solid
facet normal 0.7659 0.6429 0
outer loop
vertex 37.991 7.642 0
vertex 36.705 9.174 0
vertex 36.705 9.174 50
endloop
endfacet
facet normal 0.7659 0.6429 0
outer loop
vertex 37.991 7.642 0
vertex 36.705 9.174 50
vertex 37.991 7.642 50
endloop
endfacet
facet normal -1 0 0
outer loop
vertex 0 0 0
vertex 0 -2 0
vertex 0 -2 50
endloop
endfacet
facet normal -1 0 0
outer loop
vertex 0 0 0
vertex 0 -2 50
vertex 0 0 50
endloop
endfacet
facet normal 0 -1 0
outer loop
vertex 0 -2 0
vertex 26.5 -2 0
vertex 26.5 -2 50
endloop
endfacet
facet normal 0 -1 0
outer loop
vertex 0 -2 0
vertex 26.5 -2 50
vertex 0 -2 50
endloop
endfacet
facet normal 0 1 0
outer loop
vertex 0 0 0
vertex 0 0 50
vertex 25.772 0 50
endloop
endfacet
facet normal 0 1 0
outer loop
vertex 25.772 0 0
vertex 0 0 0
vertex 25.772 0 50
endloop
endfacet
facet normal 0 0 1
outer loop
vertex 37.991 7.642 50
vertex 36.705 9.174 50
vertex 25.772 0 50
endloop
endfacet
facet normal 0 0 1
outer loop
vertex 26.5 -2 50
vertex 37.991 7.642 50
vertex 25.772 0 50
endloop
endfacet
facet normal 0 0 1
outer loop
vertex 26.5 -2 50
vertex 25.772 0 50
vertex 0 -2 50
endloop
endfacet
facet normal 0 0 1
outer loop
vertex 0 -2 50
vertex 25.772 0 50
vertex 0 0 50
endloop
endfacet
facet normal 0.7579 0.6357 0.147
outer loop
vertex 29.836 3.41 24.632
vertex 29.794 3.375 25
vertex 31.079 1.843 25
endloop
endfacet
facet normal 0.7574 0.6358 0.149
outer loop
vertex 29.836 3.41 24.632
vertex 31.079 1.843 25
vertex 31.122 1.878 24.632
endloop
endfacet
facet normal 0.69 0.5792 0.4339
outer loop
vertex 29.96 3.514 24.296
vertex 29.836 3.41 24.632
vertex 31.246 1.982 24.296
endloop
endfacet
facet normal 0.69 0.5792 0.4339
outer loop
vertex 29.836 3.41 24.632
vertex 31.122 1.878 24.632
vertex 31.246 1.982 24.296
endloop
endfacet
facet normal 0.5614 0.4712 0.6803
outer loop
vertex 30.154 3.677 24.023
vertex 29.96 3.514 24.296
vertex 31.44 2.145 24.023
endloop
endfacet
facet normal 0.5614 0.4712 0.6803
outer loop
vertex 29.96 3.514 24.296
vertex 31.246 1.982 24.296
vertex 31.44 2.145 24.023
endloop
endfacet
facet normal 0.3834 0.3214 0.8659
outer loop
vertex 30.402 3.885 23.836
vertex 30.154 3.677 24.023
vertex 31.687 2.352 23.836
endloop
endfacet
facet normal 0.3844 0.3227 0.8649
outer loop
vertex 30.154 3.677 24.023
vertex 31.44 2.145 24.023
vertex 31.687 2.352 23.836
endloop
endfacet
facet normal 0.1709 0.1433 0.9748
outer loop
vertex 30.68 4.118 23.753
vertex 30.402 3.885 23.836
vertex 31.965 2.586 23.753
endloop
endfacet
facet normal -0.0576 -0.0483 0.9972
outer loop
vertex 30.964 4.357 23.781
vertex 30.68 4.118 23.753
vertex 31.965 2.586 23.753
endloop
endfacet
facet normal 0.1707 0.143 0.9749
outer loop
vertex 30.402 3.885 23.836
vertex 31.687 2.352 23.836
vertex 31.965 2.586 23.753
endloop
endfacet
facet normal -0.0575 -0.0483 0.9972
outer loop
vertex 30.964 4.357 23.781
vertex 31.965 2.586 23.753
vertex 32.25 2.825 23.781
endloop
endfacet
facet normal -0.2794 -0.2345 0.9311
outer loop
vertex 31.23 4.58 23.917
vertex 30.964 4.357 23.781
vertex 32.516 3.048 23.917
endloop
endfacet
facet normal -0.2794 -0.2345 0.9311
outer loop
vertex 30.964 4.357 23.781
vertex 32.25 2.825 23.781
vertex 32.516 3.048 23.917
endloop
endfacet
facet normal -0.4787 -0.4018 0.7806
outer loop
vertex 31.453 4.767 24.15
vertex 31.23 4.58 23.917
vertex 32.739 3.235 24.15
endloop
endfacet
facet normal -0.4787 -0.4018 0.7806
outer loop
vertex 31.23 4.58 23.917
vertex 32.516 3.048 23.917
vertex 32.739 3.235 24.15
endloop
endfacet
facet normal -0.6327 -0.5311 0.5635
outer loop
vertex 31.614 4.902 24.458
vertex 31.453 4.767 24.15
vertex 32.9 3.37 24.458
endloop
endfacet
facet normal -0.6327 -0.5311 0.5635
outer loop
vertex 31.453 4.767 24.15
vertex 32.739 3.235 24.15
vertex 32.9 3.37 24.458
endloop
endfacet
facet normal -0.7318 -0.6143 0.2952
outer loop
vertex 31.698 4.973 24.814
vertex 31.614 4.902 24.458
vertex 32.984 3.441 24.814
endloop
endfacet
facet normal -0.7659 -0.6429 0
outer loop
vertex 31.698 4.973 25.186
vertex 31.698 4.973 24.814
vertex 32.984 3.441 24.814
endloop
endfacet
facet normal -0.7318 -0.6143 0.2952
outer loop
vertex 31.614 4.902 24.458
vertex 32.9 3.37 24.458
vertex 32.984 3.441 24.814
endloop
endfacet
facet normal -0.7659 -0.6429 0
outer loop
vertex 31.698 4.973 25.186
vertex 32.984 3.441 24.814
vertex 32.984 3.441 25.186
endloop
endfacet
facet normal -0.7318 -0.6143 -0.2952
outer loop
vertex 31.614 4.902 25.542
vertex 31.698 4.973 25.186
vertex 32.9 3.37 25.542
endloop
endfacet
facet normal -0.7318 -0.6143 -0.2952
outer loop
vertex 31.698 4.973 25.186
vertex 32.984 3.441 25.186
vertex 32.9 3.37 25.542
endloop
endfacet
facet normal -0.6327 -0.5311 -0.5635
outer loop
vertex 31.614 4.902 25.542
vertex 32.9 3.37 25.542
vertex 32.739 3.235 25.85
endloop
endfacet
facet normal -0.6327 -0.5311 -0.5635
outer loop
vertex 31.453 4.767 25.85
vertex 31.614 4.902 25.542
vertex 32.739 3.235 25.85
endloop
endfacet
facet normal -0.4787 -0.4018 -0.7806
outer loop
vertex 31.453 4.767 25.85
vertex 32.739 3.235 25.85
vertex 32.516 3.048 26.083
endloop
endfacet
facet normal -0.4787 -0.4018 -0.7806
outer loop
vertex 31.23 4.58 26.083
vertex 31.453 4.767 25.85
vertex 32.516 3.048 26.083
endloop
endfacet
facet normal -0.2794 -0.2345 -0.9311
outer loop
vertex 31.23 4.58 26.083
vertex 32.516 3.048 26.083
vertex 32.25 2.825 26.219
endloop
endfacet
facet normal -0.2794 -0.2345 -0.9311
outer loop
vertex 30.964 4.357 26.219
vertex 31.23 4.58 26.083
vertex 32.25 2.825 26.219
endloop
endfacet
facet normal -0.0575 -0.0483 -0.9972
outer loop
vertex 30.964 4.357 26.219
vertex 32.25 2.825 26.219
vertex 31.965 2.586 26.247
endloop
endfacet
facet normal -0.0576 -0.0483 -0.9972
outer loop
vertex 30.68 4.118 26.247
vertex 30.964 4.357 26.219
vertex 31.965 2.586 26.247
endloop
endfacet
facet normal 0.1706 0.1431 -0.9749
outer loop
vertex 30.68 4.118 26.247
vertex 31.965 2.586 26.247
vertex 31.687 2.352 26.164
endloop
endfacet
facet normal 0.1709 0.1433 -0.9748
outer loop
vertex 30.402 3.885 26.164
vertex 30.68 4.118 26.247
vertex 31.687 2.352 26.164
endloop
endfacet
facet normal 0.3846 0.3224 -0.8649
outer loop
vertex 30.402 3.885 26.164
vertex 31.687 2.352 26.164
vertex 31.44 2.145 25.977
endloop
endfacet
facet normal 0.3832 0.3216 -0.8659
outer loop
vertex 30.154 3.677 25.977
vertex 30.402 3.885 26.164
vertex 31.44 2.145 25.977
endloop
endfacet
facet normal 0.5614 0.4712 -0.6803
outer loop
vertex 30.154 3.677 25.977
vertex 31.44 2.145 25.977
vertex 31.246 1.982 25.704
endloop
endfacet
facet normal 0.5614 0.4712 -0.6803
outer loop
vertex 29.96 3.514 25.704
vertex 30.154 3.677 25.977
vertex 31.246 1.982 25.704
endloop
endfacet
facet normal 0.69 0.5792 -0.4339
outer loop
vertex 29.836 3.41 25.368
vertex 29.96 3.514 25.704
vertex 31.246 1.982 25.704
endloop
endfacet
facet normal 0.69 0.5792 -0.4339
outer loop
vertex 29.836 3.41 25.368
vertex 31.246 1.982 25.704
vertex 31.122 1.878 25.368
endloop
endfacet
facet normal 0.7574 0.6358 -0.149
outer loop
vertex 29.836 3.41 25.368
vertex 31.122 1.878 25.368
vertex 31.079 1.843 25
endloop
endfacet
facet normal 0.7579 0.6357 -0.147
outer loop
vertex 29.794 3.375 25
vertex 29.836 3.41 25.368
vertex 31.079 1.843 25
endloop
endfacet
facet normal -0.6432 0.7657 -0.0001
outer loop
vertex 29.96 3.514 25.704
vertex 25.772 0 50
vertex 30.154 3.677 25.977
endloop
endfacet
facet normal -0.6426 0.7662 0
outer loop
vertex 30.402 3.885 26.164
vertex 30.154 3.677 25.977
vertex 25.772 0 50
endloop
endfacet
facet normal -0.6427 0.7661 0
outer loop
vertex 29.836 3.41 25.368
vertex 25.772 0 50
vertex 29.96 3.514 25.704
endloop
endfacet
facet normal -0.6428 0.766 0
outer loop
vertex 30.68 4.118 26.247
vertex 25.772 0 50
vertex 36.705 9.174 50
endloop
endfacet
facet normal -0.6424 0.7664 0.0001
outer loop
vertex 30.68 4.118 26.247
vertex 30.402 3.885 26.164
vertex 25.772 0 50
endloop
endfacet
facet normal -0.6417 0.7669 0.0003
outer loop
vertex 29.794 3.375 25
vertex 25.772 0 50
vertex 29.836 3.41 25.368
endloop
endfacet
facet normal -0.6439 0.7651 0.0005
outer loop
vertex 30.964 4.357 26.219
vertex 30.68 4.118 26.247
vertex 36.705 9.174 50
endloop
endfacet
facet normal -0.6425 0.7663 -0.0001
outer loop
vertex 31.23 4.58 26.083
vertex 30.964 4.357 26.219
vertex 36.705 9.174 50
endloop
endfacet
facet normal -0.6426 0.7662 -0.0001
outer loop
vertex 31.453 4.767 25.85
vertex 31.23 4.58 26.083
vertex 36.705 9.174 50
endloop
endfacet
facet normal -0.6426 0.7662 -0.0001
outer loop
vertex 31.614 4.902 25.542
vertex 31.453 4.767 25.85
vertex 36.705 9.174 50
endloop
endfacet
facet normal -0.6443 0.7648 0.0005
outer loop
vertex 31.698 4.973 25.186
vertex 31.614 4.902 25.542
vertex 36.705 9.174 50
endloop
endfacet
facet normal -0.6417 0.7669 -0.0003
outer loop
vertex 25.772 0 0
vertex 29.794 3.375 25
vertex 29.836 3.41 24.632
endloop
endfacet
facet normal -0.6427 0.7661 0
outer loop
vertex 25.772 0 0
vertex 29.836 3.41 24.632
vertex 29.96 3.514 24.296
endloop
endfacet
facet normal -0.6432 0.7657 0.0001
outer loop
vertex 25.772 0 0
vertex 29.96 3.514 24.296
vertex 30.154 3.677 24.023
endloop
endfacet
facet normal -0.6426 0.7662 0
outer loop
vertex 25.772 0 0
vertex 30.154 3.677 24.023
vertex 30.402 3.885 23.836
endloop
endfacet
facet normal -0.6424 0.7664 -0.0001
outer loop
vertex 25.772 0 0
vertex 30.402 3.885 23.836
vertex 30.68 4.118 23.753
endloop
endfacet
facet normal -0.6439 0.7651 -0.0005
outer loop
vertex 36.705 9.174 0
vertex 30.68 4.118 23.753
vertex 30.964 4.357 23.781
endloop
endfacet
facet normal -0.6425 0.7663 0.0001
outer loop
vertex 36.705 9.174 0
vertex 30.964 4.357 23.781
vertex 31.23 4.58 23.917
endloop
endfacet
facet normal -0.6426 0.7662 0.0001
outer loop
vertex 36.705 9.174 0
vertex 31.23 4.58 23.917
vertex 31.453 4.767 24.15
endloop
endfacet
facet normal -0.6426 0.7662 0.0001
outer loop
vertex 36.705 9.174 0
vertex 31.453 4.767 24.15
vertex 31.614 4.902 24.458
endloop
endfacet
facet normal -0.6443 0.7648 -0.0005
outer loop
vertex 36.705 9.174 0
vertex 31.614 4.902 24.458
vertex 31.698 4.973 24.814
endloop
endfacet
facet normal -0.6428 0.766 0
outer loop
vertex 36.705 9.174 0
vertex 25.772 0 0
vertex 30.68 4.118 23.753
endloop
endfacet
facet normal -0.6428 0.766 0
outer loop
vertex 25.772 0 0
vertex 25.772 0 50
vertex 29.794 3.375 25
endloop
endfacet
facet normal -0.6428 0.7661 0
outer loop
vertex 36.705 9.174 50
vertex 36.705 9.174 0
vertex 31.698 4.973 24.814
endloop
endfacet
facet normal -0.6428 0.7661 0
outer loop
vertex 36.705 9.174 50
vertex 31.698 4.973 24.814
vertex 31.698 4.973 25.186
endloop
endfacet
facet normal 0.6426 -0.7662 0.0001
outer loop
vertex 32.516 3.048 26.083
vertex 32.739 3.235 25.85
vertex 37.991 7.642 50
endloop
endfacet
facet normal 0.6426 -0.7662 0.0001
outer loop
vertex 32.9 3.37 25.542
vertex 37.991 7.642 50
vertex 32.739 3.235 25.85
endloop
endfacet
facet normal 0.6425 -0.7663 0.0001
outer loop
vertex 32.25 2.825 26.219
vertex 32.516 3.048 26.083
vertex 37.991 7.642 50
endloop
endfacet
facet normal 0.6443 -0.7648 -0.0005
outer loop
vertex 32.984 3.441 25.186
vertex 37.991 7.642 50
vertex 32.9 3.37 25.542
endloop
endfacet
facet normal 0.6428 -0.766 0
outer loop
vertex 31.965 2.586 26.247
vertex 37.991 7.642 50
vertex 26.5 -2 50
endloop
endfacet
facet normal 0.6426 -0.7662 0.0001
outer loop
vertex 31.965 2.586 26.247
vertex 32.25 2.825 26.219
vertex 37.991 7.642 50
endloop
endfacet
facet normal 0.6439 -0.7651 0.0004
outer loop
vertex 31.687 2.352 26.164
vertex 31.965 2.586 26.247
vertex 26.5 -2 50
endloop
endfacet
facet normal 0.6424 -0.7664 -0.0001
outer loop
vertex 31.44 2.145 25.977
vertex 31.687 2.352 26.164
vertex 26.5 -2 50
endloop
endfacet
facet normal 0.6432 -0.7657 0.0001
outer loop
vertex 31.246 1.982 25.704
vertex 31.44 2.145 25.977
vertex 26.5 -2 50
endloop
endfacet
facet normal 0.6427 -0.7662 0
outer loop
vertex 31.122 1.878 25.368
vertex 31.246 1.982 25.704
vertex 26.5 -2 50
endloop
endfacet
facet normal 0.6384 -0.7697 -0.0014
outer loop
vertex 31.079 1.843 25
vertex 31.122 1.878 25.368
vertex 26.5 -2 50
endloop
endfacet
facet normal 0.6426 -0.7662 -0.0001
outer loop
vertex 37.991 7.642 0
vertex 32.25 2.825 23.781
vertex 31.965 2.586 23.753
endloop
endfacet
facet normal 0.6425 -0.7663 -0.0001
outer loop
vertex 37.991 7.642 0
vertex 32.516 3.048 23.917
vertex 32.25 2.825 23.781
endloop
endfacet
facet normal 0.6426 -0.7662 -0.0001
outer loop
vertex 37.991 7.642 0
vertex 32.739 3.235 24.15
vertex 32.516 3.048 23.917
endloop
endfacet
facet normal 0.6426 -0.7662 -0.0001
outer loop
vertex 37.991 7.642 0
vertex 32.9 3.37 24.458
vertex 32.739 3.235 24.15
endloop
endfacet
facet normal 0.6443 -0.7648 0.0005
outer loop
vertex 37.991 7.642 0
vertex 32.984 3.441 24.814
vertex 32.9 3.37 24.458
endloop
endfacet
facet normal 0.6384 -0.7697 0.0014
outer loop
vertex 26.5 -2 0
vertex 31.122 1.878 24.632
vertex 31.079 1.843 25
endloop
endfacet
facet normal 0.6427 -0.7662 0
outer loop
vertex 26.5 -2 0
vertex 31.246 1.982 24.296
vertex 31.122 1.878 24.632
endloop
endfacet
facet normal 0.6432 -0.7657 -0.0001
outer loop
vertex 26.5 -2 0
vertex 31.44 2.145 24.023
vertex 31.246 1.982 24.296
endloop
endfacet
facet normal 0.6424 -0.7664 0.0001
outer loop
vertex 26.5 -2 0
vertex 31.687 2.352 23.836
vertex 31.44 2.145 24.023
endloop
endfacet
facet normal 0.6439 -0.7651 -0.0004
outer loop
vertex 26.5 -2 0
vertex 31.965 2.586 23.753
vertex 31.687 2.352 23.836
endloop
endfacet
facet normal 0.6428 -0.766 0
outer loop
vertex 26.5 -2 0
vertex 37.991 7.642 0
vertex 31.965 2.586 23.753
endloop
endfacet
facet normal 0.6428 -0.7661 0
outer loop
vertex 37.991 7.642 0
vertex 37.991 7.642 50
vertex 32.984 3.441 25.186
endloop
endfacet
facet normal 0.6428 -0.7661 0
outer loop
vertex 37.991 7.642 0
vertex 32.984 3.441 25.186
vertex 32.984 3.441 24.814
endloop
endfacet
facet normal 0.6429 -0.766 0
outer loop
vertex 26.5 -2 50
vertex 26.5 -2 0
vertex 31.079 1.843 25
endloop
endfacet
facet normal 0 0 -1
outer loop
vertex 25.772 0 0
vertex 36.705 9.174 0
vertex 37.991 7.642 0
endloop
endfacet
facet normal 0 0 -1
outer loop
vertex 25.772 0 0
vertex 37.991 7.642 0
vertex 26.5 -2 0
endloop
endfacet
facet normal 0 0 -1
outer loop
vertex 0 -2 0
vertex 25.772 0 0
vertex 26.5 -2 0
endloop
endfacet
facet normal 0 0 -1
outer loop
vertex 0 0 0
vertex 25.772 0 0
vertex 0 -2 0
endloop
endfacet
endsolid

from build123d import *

# Parameters (mm, degrees)
EXTRUDE_1_DEPTH = 50
M3X0_5_1_D      = 2.5
M3X0_5_1_DEPTH  = 8.5
M3X0_5_1_TIP    = 0.751075774


with BuildPart() as part:
    # ｽｹｯﾁ1 → ﾎﾞｽ - 押し出し1 (new body)
    with BuildSketch(Plane.XY):
        Polygon((0, 0), (25.772059531, 0), (36.705091427, 9.173903032), (37.990666647, 7.641814145), (26.5, -2), (0, -2), align=None)
    extrude(amount=EXTRUDE_1_DEPTH)

    # M3x0.5 ねじ穴1
    with Locations(Plane(origin=(30.751348412, 4.178119463, 25), x_dir=(0.766044443, 0.64278761, 0), z_dir=(-0.64278761, 0.766044443, 0))):
        with Locations((0, 0)):
            Hole(M3X0_5_1_D / 2, depth=M3X0_5_1_DEPTH)
            with Locations((0, 0, -(M3X0_5_1_DEPTH + M3X0_5_1_TIP / 2))):  # 118° drill point
                Cone(0, M3X0_5_1_D / 2, M3X0_5_1_TIP, mode=Mode.SUBTRACT)


solid = part.part
